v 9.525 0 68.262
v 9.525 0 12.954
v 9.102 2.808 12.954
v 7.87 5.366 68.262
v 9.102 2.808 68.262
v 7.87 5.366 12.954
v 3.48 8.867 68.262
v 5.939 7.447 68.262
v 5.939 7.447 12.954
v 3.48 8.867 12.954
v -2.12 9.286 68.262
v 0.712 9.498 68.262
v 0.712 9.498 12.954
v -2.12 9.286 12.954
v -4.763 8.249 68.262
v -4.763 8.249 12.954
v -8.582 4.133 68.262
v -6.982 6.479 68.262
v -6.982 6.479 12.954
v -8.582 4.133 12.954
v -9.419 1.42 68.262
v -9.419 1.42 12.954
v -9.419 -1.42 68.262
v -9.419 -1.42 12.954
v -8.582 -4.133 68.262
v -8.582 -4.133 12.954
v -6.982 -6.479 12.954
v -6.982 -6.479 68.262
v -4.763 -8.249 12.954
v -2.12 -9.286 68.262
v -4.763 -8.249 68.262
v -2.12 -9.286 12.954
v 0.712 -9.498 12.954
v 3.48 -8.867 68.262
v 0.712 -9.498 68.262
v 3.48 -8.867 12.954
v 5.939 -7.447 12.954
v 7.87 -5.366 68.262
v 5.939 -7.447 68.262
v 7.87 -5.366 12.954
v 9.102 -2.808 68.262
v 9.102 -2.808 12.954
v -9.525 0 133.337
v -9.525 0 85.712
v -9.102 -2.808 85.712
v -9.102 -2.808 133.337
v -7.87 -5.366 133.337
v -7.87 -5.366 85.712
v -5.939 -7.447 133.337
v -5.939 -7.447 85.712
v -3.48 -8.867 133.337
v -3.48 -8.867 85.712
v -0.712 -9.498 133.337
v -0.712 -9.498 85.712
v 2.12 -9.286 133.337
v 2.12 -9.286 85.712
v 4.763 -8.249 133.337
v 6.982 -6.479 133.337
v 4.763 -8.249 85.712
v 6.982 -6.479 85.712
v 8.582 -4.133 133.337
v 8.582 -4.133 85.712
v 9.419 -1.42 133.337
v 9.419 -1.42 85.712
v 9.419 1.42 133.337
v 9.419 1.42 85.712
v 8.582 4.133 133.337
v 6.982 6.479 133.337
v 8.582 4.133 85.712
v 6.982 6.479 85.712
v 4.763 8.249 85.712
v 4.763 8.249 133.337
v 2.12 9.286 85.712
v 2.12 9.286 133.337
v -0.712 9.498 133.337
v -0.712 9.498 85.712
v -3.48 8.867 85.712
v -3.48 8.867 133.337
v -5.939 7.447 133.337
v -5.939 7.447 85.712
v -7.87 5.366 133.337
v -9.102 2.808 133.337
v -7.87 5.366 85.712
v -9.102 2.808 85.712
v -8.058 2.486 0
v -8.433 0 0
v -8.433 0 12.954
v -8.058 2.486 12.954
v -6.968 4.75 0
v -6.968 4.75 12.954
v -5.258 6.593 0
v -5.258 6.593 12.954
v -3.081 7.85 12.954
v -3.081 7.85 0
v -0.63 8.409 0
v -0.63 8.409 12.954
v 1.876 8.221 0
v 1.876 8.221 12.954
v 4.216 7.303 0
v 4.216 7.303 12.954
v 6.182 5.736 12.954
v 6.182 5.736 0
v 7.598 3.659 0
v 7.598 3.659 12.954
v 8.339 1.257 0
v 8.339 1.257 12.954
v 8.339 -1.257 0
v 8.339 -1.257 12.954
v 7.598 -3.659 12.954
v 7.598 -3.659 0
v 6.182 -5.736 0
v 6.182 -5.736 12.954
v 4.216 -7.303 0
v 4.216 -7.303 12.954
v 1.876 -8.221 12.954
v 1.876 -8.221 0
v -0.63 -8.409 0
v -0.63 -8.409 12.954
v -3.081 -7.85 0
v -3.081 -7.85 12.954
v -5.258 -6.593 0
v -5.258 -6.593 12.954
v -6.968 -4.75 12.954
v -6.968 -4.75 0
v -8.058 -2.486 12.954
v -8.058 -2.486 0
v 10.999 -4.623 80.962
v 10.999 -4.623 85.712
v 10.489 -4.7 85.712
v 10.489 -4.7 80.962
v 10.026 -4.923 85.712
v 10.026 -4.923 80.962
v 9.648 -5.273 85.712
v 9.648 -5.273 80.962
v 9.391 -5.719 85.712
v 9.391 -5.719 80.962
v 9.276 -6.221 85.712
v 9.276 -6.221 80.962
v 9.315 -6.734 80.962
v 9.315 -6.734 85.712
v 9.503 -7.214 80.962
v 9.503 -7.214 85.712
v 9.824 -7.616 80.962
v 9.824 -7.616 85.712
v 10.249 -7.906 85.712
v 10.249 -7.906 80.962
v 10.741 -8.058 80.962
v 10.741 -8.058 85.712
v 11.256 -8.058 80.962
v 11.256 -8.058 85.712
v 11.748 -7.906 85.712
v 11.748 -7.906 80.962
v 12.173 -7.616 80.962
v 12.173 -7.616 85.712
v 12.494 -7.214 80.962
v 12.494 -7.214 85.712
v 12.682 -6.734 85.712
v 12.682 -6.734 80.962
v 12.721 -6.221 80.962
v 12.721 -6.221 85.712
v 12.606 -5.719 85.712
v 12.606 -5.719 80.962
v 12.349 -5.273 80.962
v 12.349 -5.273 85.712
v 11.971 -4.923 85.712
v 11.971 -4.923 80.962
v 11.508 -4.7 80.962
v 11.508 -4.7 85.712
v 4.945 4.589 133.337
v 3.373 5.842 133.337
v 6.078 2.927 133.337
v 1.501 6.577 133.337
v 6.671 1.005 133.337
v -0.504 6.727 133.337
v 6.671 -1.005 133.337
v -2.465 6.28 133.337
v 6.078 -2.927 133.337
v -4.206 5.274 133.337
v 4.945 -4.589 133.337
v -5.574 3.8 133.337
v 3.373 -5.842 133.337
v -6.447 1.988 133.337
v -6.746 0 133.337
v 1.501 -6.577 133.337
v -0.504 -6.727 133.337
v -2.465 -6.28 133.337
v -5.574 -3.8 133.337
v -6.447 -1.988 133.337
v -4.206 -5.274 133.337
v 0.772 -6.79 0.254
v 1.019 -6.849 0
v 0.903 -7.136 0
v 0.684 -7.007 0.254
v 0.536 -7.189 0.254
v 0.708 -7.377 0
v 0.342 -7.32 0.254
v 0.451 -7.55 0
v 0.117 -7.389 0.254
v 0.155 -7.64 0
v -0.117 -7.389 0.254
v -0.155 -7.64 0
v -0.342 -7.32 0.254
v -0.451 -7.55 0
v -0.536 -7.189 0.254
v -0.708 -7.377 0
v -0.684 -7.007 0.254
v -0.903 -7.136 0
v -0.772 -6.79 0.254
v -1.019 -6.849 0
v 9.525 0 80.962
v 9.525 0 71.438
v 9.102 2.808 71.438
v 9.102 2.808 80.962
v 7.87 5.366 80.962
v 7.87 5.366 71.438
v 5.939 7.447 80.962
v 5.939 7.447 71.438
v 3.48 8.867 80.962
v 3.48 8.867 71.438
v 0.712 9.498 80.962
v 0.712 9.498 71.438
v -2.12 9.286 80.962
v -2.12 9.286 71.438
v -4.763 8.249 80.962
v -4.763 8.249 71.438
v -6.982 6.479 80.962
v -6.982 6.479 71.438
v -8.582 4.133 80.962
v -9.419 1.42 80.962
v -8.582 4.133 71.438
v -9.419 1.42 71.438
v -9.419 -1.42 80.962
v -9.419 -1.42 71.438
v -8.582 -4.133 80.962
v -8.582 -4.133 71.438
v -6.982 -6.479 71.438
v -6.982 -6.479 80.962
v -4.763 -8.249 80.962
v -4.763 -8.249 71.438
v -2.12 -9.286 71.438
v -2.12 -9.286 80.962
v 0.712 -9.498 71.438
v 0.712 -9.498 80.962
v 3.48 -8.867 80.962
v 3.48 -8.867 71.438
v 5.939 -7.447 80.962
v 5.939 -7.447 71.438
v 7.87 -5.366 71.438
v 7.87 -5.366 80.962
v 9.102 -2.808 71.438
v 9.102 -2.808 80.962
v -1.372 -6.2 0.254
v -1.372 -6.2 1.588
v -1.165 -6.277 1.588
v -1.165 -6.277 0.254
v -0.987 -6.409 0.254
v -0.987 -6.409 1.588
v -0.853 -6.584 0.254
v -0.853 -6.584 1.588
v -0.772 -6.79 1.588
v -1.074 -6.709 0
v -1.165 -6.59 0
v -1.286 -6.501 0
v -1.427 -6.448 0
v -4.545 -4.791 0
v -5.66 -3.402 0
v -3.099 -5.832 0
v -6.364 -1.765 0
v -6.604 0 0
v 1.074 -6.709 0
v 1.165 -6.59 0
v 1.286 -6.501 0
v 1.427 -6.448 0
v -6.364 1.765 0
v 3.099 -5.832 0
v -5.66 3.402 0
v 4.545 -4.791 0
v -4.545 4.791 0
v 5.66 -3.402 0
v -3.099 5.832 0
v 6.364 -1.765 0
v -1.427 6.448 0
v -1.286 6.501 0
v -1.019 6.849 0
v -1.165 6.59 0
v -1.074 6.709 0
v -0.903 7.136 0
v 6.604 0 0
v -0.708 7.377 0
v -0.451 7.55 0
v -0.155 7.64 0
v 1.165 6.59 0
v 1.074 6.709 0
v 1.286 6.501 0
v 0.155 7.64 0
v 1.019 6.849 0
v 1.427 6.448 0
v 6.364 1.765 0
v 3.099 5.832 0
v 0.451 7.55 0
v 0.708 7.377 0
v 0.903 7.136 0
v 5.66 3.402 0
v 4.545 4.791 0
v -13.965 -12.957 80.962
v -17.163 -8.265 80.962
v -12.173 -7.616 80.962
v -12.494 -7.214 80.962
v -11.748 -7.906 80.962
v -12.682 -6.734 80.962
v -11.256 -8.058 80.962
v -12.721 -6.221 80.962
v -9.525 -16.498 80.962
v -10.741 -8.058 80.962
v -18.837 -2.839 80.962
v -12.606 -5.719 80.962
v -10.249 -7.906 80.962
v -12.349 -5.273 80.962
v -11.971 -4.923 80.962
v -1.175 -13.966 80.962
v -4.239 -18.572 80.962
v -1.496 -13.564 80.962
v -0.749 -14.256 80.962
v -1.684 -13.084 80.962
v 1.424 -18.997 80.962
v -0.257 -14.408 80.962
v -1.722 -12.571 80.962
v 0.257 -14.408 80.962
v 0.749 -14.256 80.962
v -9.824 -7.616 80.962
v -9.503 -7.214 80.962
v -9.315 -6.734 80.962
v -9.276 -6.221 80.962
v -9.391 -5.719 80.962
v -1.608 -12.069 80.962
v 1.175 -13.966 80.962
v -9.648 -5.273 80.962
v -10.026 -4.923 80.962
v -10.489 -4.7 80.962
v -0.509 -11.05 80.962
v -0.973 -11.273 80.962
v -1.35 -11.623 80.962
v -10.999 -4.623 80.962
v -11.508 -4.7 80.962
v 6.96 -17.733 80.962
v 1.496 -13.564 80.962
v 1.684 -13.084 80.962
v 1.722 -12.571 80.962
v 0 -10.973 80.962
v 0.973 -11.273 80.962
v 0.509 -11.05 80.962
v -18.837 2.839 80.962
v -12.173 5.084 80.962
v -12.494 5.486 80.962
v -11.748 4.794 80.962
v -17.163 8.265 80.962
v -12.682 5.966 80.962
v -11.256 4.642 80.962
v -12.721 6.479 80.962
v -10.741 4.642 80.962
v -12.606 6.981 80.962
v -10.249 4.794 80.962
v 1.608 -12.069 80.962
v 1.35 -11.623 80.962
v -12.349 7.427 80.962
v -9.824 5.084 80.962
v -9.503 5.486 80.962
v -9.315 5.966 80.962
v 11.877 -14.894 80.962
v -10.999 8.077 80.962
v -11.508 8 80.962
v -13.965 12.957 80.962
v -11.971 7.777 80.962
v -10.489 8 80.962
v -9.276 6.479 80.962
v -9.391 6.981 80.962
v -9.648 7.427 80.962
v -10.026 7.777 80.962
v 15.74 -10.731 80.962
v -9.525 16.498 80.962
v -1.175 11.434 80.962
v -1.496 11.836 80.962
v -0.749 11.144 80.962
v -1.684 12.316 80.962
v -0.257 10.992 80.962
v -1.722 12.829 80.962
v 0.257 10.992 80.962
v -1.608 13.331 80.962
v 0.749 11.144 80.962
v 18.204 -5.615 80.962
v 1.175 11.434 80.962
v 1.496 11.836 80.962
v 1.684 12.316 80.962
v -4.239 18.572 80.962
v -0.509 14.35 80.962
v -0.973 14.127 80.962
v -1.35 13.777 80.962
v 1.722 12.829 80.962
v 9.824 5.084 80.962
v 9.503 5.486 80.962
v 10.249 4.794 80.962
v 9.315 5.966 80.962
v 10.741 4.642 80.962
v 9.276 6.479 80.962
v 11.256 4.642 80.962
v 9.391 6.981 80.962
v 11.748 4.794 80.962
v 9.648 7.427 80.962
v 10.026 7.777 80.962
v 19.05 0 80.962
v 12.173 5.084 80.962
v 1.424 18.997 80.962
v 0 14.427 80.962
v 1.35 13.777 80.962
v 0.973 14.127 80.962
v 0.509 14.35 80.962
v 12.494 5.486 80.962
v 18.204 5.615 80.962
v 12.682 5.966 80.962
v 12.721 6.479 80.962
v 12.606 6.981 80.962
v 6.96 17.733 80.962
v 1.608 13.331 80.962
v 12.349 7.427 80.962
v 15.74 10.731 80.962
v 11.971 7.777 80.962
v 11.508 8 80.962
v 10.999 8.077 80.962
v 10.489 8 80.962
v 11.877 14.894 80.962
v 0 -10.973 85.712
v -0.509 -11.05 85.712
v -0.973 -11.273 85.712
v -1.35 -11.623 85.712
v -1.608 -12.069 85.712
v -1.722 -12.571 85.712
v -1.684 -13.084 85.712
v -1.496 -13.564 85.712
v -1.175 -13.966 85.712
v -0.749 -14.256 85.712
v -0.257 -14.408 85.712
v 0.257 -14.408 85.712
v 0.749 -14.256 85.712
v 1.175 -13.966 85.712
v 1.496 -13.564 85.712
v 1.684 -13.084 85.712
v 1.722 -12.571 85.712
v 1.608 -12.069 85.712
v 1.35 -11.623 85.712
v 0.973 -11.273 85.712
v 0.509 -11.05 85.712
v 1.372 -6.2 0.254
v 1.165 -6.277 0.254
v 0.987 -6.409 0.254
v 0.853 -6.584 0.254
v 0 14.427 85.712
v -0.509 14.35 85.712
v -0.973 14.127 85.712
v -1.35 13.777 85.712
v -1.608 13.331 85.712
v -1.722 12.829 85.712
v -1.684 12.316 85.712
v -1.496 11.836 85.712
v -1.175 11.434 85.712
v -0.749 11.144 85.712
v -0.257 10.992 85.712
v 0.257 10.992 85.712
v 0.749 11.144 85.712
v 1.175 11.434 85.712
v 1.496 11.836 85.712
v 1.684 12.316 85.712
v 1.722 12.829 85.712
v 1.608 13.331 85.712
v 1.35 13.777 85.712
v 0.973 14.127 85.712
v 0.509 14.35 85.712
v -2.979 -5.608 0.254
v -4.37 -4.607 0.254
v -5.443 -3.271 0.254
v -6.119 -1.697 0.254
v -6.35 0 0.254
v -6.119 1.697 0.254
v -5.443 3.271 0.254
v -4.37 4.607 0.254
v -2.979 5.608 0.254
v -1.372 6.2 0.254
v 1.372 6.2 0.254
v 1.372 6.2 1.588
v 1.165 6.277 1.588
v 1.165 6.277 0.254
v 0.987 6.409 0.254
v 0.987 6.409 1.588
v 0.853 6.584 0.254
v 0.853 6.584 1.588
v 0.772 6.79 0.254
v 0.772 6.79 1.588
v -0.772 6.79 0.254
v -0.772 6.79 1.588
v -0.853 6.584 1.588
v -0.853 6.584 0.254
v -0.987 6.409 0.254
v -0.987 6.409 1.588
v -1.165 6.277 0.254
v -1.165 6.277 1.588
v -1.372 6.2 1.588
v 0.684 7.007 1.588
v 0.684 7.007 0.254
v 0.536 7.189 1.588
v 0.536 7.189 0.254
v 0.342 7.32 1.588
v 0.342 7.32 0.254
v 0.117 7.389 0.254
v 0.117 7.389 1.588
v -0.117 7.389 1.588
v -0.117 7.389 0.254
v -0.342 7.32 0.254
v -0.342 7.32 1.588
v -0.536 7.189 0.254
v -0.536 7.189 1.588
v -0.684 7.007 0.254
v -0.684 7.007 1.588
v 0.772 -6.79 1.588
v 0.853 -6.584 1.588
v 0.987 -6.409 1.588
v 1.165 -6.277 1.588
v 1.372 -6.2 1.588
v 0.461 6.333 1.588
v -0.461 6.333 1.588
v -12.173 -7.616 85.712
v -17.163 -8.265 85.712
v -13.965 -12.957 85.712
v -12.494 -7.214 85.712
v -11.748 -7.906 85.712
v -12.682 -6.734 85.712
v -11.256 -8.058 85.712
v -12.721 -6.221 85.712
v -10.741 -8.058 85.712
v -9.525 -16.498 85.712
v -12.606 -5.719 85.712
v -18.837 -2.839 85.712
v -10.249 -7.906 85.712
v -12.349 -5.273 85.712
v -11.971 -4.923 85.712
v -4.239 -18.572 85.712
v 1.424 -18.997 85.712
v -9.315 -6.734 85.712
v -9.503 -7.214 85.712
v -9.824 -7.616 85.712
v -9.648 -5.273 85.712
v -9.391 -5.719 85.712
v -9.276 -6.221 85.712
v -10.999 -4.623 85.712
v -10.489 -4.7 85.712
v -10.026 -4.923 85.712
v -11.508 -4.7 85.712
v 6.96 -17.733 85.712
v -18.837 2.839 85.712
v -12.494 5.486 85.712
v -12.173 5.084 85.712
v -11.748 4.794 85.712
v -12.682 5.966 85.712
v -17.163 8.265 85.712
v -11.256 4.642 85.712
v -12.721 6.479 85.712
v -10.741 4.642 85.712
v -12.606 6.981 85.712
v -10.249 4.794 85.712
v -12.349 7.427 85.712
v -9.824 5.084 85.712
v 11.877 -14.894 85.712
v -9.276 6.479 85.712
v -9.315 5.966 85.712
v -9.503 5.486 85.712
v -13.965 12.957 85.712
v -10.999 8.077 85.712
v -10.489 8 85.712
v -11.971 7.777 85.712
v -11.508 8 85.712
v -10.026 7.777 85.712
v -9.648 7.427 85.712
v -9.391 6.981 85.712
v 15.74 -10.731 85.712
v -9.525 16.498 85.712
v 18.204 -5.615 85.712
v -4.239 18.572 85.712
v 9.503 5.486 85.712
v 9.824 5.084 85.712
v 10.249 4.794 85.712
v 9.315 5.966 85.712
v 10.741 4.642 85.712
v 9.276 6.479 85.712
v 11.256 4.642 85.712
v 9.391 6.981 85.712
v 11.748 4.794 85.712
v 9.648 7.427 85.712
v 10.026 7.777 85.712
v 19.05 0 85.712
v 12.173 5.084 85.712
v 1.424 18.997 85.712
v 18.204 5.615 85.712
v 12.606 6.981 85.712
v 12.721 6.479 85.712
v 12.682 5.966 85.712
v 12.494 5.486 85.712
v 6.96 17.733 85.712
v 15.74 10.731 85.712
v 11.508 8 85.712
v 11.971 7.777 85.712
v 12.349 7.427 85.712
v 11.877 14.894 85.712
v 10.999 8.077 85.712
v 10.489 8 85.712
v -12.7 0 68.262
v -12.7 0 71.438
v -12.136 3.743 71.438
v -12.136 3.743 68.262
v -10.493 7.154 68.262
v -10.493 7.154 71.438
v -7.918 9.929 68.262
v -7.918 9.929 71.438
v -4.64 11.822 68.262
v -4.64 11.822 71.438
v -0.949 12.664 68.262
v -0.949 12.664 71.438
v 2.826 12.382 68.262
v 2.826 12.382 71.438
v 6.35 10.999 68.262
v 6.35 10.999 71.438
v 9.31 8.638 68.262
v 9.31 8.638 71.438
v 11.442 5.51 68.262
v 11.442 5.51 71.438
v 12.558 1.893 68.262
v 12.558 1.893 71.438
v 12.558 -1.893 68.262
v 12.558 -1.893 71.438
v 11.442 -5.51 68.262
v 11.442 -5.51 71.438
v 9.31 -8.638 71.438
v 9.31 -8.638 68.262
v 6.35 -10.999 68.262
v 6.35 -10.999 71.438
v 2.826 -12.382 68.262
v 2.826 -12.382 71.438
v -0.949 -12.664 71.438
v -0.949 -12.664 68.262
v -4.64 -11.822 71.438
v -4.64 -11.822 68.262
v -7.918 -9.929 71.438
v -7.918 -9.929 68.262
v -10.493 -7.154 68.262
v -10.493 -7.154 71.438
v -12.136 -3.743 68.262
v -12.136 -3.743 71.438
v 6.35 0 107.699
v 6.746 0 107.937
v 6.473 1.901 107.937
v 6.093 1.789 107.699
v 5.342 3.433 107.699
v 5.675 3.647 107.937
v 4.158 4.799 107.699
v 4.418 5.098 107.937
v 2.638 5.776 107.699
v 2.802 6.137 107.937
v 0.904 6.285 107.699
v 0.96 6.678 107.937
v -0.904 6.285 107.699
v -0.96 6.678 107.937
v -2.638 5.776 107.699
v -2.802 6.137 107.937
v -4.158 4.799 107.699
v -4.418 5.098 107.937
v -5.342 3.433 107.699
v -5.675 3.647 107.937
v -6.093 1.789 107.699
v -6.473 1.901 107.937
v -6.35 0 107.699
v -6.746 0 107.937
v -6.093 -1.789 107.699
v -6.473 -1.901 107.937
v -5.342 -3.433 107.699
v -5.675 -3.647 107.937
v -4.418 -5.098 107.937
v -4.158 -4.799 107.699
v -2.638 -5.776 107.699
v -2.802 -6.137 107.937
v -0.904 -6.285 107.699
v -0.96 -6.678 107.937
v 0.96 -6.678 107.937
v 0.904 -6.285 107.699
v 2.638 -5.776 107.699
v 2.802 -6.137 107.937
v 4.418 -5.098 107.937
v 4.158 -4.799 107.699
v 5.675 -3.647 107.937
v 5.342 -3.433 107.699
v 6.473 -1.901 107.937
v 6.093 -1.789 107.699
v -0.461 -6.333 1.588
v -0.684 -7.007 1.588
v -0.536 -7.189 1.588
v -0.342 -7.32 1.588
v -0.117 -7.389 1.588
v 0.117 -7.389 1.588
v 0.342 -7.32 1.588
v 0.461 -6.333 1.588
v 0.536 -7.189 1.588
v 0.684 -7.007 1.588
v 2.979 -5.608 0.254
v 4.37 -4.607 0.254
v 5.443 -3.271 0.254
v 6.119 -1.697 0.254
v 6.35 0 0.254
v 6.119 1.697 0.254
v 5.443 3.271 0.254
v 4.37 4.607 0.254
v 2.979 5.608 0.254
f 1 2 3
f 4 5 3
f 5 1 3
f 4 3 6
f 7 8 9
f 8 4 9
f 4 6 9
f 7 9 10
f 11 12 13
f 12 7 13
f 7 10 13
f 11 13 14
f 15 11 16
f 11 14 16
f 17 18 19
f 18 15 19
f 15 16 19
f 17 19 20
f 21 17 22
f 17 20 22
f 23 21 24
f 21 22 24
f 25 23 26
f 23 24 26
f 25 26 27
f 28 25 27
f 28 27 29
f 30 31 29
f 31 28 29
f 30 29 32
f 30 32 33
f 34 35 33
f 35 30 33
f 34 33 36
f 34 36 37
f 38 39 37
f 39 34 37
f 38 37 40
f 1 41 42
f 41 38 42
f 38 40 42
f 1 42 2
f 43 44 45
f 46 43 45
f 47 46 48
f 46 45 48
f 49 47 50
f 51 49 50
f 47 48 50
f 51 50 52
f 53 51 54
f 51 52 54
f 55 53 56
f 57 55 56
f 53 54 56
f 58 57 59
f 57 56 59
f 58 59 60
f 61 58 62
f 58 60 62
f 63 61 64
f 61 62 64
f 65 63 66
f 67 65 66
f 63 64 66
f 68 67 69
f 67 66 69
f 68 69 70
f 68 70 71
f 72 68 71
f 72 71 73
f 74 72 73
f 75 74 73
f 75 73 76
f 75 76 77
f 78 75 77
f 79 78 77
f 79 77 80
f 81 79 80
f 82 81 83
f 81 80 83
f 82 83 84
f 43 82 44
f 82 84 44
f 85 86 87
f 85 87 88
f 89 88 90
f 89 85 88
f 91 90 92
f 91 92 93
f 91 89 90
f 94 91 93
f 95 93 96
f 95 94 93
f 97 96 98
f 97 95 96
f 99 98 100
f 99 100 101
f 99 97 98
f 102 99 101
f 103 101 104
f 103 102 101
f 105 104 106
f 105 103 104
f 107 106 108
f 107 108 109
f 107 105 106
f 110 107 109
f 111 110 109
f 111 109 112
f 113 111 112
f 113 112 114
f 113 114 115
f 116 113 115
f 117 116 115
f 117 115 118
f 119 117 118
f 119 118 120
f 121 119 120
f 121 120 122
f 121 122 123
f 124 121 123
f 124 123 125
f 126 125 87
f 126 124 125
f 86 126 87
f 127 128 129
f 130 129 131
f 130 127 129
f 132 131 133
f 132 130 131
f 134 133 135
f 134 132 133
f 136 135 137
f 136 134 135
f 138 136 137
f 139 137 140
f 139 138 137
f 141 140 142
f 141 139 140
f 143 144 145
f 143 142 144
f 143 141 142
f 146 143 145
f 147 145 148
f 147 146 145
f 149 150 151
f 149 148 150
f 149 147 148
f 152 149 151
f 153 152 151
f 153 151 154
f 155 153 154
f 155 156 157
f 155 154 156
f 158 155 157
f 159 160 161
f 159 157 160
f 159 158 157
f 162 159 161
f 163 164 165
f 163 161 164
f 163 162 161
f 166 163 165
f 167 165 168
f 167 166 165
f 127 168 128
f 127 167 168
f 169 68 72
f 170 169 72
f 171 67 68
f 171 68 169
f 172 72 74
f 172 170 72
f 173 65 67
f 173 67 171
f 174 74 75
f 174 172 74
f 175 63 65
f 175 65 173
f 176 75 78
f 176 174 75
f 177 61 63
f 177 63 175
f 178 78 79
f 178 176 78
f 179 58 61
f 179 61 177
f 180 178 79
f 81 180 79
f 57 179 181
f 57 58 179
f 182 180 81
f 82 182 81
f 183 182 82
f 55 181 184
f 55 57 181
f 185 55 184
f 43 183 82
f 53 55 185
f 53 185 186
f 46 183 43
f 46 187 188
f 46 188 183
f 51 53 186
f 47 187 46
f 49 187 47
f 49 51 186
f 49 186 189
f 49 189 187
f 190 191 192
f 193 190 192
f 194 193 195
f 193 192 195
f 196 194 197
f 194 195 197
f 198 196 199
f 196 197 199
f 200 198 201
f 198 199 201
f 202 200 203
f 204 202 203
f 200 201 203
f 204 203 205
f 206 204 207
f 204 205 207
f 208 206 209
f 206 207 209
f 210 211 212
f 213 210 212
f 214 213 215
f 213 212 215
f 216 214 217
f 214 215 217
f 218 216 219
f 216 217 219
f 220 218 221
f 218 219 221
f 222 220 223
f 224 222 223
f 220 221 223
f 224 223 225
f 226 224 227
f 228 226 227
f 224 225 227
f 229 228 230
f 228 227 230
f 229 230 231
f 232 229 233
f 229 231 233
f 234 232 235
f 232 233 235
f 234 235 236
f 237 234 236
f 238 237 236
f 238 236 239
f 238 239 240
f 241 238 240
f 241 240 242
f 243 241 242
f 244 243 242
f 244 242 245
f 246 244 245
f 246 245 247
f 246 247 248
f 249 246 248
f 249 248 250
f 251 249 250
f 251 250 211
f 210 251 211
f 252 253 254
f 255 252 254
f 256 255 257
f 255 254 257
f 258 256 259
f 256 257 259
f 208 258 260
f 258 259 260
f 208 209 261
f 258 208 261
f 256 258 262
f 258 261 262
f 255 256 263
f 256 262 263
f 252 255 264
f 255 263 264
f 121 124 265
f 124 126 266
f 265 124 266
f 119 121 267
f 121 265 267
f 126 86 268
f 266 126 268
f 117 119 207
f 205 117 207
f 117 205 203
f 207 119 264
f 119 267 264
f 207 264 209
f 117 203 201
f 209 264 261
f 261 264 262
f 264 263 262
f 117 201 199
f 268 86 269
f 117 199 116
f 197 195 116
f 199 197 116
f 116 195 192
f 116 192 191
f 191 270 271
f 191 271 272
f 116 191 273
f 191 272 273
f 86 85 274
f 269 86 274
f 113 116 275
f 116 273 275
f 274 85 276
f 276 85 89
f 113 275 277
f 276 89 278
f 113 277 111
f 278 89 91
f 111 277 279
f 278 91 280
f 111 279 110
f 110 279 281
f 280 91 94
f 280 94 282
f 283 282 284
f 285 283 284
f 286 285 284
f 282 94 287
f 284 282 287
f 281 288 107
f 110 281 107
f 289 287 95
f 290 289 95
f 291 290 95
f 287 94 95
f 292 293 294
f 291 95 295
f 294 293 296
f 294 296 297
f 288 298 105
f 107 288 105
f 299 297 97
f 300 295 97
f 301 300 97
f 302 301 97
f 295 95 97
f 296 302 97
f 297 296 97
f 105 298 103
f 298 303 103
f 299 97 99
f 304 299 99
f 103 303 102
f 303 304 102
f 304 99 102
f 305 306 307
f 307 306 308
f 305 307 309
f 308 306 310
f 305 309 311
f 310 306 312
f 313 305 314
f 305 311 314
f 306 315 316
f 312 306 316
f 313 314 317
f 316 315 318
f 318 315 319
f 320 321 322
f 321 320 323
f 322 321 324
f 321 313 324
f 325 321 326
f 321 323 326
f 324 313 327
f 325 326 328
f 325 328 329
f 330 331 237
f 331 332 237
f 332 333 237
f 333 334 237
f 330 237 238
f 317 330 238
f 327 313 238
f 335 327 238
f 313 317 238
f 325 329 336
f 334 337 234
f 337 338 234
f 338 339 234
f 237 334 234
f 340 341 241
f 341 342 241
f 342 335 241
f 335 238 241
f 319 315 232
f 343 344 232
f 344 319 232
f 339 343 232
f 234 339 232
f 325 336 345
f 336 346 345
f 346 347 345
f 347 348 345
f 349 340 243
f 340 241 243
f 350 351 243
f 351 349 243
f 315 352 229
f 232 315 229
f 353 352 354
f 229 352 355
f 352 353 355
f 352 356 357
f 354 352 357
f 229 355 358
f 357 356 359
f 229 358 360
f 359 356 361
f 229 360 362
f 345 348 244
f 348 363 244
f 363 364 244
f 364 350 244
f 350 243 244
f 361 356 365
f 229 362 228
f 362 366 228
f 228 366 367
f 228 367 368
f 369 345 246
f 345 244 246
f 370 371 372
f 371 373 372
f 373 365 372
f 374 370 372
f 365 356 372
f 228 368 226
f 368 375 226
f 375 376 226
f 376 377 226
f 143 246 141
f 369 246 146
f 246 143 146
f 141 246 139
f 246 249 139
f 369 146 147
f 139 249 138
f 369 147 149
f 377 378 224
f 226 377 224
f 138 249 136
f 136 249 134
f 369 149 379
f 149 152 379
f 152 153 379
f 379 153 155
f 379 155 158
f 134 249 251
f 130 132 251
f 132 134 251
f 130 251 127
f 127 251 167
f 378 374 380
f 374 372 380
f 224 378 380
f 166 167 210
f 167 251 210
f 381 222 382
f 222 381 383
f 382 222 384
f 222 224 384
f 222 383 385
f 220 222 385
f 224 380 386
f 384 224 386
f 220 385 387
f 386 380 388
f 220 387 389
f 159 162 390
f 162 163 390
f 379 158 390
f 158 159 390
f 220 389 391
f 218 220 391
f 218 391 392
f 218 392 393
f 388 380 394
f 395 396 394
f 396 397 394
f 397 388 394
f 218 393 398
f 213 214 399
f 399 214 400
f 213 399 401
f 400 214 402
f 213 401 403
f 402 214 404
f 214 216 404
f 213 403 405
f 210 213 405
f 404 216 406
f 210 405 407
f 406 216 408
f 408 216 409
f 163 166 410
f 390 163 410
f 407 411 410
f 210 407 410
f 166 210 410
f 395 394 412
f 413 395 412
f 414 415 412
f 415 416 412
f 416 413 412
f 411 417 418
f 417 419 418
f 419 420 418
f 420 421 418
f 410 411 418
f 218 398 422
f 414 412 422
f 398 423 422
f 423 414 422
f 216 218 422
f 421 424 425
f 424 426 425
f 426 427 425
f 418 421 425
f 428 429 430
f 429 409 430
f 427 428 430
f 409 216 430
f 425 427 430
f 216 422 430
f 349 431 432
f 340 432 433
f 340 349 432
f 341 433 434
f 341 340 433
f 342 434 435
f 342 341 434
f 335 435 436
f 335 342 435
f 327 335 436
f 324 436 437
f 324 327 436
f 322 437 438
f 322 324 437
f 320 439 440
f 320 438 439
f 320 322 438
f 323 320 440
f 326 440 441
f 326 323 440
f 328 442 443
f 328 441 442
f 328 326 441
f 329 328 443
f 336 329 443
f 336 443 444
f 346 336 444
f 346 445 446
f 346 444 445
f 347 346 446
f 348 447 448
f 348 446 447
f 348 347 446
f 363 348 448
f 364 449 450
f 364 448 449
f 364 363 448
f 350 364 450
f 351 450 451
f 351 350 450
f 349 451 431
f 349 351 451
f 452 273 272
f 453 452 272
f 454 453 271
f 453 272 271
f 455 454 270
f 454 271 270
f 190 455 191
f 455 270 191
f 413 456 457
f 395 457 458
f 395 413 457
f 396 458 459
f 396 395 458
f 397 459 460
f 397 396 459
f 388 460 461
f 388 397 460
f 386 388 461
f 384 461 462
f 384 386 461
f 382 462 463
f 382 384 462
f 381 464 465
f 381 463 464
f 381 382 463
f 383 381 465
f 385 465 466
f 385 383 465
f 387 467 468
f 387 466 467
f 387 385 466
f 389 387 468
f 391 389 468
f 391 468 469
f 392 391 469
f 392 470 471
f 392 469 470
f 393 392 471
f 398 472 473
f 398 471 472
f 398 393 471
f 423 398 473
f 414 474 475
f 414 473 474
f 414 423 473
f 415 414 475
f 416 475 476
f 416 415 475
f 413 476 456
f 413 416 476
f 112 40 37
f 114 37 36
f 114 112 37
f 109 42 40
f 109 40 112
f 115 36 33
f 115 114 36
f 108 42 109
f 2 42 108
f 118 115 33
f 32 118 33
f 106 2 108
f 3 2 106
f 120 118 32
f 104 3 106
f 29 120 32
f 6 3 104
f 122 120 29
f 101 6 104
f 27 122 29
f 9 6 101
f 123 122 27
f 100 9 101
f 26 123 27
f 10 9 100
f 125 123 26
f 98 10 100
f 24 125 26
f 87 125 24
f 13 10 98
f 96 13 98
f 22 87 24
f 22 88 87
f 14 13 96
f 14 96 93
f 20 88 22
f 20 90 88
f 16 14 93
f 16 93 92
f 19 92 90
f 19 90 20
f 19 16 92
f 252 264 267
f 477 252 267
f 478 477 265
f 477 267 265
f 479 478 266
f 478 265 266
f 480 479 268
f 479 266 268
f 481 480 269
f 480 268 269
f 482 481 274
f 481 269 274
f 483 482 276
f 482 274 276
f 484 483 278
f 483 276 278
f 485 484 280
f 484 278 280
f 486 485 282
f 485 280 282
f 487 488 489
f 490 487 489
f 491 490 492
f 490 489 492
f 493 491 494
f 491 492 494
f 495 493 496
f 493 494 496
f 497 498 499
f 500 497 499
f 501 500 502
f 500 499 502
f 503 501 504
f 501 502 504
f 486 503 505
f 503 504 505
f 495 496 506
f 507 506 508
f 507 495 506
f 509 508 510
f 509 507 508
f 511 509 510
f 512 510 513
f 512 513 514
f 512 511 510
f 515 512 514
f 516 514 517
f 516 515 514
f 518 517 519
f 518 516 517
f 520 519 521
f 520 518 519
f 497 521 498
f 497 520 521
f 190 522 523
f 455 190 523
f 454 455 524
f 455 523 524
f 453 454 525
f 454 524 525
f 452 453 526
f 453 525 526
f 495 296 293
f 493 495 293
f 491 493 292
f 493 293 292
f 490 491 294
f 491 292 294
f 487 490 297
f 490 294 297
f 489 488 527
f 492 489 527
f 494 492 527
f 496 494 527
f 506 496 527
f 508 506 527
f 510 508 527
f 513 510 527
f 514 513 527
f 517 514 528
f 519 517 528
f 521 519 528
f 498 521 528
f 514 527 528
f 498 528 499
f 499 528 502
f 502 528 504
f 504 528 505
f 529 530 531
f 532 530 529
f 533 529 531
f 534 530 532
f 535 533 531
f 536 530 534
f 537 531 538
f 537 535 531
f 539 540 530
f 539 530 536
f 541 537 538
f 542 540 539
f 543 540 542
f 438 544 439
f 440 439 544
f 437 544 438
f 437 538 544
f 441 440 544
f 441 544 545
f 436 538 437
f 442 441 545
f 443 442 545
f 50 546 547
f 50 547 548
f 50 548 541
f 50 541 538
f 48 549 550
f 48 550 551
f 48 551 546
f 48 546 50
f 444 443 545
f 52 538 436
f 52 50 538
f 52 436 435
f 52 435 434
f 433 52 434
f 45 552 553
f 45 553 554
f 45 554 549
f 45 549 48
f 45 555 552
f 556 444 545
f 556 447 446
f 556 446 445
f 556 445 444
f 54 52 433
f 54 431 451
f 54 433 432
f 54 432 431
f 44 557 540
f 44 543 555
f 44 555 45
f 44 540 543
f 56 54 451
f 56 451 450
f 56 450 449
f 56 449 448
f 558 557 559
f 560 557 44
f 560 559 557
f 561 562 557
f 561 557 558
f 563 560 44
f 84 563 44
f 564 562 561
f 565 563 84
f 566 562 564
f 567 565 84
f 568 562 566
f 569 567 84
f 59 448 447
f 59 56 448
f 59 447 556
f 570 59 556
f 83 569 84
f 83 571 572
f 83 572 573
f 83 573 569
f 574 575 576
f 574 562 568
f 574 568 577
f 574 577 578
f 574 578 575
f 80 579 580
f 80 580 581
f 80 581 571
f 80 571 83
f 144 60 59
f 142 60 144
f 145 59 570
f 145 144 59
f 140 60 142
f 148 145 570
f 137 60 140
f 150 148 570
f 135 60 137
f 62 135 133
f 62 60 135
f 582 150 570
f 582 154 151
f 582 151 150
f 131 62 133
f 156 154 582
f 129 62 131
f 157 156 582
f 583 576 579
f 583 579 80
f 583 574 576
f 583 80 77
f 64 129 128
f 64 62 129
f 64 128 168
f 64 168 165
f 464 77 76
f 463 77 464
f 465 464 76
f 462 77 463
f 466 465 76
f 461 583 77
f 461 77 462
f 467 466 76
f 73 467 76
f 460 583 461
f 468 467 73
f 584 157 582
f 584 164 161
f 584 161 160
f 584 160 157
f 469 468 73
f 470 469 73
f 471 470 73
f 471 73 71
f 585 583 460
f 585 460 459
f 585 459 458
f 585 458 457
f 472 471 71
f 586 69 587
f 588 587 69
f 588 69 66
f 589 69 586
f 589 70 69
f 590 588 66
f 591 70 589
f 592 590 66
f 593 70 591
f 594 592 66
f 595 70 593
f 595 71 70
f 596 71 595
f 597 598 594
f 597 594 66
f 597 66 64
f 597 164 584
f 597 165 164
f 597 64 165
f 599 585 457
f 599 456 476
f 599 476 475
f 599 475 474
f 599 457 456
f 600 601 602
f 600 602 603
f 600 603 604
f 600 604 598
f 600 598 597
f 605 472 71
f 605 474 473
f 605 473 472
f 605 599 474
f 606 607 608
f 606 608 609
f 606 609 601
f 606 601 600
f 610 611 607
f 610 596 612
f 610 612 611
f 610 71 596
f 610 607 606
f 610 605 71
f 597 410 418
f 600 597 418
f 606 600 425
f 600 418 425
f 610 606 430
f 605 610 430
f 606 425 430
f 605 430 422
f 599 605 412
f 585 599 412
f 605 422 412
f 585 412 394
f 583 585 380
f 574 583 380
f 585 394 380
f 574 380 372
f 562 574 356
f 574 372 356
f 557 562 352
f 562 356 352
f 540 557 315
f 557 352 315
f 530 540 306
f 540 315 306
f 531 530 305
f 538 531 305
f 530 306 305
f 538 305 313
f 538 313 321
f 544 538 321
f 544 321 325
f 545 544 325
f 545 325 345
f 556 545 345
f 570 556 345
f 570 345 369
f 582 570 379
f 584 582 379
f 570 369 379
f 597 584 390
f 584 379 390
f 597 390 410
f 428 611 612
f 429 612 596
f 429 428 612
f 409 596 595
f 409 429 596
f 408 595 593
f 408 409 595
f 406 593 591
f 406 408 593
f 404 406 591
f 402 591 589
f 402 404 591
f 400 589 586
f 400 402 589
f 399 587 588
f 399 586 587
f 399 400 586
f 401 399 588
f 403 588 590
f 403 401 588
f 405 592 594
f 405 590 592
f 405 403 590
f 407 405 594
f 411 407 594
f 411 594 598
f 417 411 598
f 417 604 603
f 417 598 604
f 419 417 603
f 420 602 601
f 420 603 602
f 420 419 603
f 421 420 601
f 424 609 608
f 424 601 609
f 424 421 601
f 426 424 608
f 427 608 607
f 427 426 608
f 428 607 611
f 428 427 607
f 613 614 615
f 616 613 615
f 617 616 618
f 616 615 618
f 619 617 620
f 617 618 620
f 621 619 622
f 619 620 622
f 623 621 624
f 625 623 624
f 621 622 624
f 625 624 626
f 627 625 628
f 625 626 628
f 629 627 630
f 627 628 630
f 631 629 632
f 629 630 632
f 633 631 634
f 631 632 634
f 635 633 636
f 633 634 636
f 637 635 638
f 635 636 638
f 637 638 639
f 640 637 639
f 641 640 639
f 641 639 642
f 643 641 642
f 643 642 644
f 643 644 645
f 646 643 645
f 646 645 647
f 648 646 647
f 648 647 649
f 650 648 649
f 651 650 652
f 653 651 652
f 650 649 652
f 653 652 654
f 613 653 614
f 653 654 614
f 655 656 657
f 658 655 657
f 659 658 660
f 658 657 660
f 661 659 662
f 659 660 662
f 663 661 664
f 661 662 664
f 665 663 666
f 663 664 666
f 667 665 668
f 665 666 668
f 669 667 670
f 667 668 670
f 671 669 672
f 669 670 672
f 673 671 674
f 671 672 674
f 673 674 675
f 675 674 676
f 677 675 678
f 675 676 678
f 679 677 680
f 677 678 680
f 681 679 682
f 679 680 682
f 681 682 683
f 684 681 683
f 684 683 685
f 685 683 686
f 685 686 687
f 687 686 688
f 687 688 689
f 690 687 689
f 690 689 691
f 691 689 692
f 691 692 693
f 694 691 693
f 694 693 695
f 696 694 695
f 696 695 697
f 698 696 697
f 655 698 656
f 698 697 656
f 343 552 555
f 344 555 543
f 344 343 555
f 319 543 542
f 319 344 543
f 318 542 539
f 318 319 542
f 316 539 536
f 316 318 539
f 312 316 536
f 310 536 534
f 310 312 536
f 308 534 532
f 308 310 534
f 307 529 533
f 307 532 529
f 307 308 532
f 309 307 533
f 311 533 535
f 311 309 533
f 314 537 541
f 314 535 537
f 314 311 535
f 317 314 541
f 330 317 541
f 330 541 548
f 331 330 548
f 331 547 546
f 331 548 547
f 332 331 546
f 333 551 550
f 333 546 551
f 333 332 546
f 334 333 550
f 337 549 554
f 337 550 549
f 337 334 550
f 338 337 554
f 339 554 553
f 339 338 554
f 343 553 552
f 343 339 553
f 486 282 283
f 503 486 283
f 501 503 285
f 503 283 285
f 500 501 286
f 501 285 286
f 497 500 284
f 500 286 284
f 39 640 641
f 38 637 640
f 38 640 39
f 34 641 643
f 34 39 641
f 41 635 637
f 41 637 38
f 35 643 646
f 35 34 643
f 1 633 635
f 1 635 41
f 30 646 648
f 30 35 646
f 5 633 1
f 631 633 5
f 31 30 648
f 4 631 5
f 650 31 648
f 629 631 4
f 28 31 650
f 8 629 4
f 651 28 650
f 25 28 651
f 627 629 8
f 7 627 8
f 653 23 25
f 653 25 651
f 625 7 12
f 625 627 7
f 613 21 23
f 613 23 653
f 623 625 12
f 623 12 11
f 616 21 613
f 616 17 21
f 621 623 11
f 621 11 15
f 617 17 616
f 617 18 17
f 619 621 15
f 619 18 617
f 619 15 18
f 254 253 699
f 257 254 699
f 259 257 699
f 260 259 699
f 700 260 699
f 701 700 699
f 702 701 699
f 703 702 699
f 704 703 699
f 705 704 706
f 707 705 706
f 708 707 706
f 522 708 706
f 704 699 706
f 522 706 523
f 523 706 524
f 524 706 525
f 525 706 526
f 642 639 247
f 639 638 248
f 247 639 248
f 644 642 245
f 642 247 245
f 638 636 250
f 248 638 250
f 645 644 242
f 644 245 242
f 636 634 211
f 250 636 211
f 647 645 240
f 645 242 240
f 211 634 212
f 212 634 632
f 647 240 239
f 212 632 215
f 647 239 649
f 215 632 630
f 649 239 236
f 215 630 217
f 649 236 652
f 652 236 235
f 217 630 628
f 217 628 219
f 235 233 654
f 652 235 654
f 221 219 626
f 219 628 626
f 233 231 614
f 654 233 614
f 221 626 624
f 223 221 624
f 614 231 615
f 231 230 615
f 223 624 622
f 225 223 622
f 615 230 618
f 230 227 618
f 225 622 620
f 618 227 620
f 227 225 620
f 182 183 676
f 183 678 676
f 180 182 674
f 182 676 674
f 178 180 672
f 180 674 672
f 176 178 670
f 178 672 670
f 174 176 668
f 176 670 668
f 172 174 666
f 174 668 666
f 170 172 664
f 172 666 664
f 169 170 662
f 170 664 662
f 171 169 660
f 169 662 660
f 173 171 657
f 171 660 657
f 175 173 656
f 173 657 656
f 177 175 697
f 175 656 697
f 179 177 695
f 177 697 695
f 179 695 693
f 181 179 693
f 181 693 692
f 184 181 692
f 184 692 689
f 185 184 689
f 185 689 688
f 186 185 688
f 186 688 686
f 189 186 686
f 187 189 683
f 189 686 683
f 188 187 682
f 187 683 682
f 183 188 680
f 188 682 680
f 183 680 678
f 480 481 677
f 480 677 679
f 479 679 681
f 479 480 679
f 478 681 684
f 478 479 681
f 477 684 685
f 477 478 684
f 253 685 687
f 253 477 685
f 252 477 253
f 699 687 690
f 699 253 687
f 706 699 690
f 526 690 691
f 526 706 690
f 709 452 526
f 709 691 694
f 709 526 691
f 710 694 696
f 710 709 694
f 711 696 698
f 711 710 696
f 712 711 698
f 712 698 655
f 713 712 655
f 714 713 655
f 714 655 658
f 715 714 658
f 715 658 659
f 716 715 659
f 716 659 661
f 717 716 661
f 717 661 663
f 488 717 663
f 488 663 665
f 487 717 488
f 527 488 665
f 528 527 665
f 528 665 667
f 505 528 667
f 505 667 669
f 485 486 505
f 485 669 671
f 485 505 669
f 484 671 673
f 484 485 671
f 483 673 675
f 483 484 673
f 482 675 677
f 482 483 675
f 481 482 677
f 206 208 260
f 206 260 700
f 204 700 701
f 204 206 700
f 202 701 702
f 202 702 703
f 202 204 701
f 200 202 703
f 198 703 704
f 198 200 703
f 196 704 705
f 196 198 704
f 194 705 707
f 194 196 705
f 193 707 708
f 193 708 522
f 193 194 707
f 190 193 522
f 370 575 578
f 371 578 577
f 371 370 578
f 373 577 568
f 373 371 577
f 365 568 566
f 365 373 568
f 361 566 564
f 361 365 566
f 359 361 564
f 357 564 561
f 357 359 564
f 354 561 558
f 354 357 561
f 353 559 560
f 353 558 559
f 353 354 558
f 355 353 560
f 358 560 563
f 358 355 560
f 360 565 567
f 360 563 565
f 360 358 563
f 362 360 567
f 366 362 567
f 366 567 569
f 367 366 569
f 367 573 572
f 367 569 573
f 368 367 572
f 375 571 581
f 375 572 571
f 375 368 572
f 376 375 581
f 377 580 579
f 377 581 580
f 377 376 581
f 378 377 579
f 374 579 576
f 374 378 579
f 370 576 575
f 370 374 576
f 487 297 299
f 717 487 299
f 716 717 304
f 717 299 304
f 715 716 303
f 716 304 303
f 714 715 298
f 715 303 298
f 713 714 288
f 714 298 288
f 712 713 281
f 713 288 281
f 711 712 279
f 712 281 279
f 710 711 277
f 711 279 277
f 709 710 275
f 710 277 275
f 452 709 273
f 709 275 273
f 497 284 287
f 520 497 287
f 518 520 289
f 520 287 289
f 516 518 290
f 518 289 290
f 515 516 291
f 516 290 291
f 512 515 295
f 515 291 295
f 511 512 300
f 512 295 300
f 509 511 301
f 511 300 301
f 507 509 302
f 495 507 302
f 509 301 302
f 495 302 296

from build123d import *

# Parameters (mm, degrees)
SKETCH1_R                      = 9.525
BOSS_EXTRUDE1_DEPTH            = 80.9625
SKETCH2_R                      = 19.05
BOSS_EXTRUDE2_DEPTH            = 4.7498
SKETCH5_OUTSIDE_W              = 60.348
SKETCH5_OUTSIDE_H              = 60.348
SKETCH5_OUTSIDE_R              = 8.4328
CUT_EXTRUDE1_DEPTH             = 12.954
SKETCH7_R                      = 12.7
BOSS_EXTRUDE3_DEPTH            = 3.175
F_8_32_TAPPED_HOLE1_AT_2_COUNT = 2
F_8_32_TAPPED_HOLE1_AT_2_PITCH = 12.7
F_8_32_TAPPED_HOLE1_AT_3_COUNT = 2
F_8_32_TAPPED_HOLE1_AT_3_PITCH = 21.997045256
F_8_32_TAPPED_HOLE1_AT_4_COUNT = 2
F_8_32_TAPPED_HOLE1_AT_4_PITCH = 25.4
F_8_32_TAPPED_HOLE1_AT_5_COUNT = 2
F_8_32_TAPPED_HOLE1_AT_5_PITCH = 21.997045256
F_8_32_TAPPED_HOLE1_AT_6_COUNT = 2
F_8_32_TAPPED_HOLE1_AT_6_PITCH = 12.7
SKETCH6_R                      = 6.35
CUT_EXTRUDE2_DEPTH             = 90.846554588
SKETCH10_R                     = 9.525
SKETCH10_R_2                   = 6.35
BOSS_EXTRUDE4_DEPTH            = 47.625
F_5_8_11_TAPPED_HOLE1_D        = 13.49248
F_5_8_11_TAPPED_HOLE1_DEPTH    = 25.4
F_5_8_11_TAPPED_HOLE1_TIP      = 4.053549943
CUT_EXTRUDE3_DEPTH             = 1.5875
FILLET1_R                      = 0.79375
CHAMFER1_SIZE                  = 0.254


with BuildPart() as part:
    # Sketch1 → Boss-Extrude1 (new body)
    with BuildSketch(Plane.XY):
        Circle(SKETCH1_R)
    extrude(amount=BOSS_EXTRUDE1_DEPTH)

    # Sketch2 → Boss-Extrude2 (add)
    with BuildSketch(Plane.XY.offset(80.9625)):
        Circle(SKETCH2_R)
    extrude(amount=BOSS_EXTRUDE2_DEPTH)

    # Sketch5 outside → Cut-Extrude1 (cut)
    with BuildSketch(Plane(origin=(0, 0, 0), x_dir=(-1, 0, 0), z_dir=(0, 0, -1))):
        Rectangle(SKETCH5_OUTSIDE_W, SKETCH5_OUTSIDE_H)
        Circle(SKETCH5_OUTSIDE_R, mode=Mode.SUBTRACT)
    extrude(amount=-CUT_EXTRUDE1_DEPTH, mode=Mode.SUBTRACT)

    # Sketch7 → Boss-Extrude3 (add)
    with BuildSketch(Plane(origin=(0, 0, 71.4375), x_dir=(-1, 0, 0), z_dir=(0, 0, -1))):
        Circle(SKETCH7_R)
    extrude(amount=BOSS_EXTRUDE3_DEPTH)

    # Sketch8 → #8-32 Tapped Hole1 (revolve, cut)
    with BuildSketch(Plane(origin=(0, 12.7, 80.9625), x_dir=(0, 1, 0), z_dir=(1, 0, 0))):
        Polygon((0, 0), (0, 11.705806461), (1.7272, 10.668), (1.7272, 0), align=None)
    f_8_32_tapped_hole1 = revolve(axis=Axis((0, 12.7, 74.6125), (0, 0, 1)), mode=Mode.SUBTRACT)

    # #8-32 Tapped Hole1 at 2: #8-32 Tapped Hole1 ×2
    with Locations(*[Vector(-0.8660254037844382, -0.500000000000001, 0) * (i * F_8_32_TAPPED_HOLE1_AT_2_PITCH) for i in range(1, F_8_32_TAPPED_HOLE1_AT_2_COUNT)]):
        add(f_8_32_tapped_hole1, mode=Mode.SUBTRACT)

    # #8-32 Tapped Hole1 at 3: #8-32 Tapped Hole1 ×2
    with Locations(*[Vector(-0.5000000000000153, -0.8660254037844298, 0) * (i * F_8_32_TAPPED_HOLE1_AT_3_PITCH) for i in range(1, F_8_32_TAPPED_HOLE1_AT_3_COUNT)]):
        add(f_8_32_tapped_hole1, mode=Mode.SUBTRACT)

    # #8-32 Tapped Hole1 at 4: #8-32 Tapped Hole1 ×2
    with Locations(*[(0, -i * F_8_32_TAPPED_HOLE1_AT_4_PITCH, 0) for i in range(1, F_8_32_TAPPED_HOLE1_AT_4_COUNT)]):
        add(f_8_32_tapped_hole1, mode=Mode.SUBTRACT)

    # #8-32 Tapped Hole1 at 5: #8-32 Tapped Hole1 ×2
    with Locations(*[Vector(0.4999999999999846, -0.8660254037844476, 0) * (i * F_8_32_TAPPED_HOLE1_AT_5_PITCH) for i in range(1, F_8_32_TAPPED_HOLE1_AT_5_COUNT)]):
        add(f_8_32_tapped_hole1, mode=Mode.SUBTRACT)

    # #8-32 Tapped Hole1 at 6: #8-32 Tapped Hole1 ×2
    with Locations(*[Vector(0.86602540378443, -0.5000000000000151, 0) * (i * F_8_32_TAPPED_HOLE1_AT_6_PITCH) for i in range(1, F_8_32_TAPPED_HOLE1_AT_6_COUNT)]):
        add(f_8_32_tapped_hole1, mode=Mode.SUBTRACT)

    # Sketch6 → Cut-Extrude2 (cut, through all)
    with BuildSketch(Plane(origin=(0, 0, 0), x_dir=(-1, 0, 0), z_dir=(0, 0, -1))):
        Circle(SKETCH6_R)
    extrude(amount=-CUT_EXTRUDE2_DEPTH, mode=Mode.SUBTRACT)

    # Sketch10 → Boss-Extrude4 (add)
    with BuildSketch(Plane.XY.offset(85.7123)):
        with Locations(Location((0, 0, 0), (0, 0, 180))):
            Circle(SKETCH10_R)
        with Locations(Location((0, 0, 0), (0, 0, 180))):
            Circle(SKETCH10_R_2, mode=Mode.SUBTRACT)
    extrude(amount=BOSS_EXTRUDE4_DEPTH)

    # 5/8-11 Tapped Hole1
    with Locations(Plane.XY.offset(133.3373)):
        with Locations((0, 0)):
            Hole(F_5_8_11_TAPPED_HOLE1_D / 2, depth=F_5_8_11_TAPPED_HOLE1_DEPTH)
            with Locations((0, 0, -(F_5_8_11_TAPPED_HOLE1_DEPTH + F_5_8_11_TAPPED_HOLE1_TIP / 2))):  # 118° drill point
                Cone(0, F_5_8_11_TAPPED_HOLE1_D / 2, F_5_8_11_TAPPED_HOLE1_TIP, mode=Mode.SUBTRACT)

    # Sketch13 → Cut-Extrude3 (cut)
    with BuildSketch(Plane(origin=(0, 0, 0), x_dir=(-1, 0, 0), z_dir=(0, 0, -1))):
        with BuildLine():
            Line((-0.79375, -6.604), (-0.79375, 6.604))
            ThreePointArc((-0.79375, 6.604), (0, 7.39775), (0.79375, 6.604))
            Line((0.79375, 6.604), (0.79375, -6.604))
            ThreePointArc((0.79375, -6.604), (0, -7.39775), (-0.79375, -6.604))
        make_face()
    extrude(amount=-CUT_EXTRUDE3_DEPTH, mode=Mode.SUBTRACT)

    # Fillet1
    # the kernel refuses this fillet: 0.79375 mm, written as the material it takes off along each edge
    with BuildSketch(Plane(origin=(0.79375, -6.300195309, 1.5875), x_dir=(0.9853201649720871, 0.17071664388506244, 0), z_dir=(0, 0, -1)), Plane(origin=(-0.79375, 6.300195309, 1.5875), x_dir=(-0.9853201649720869, -0.17071664388506383, 0), z_dir=(0, 0, -1))) as fillet1_piece_1:
        with BuildLine():
            CenterArc((0.623581926, 0.792901977), FILLET1_R, 203.344606785, 64.006660147)
            Line((-0.105190236, 0.478370264), (-0.178067452, 0.446917093))
            ThreePointArc((-0.178067452, 0.446917093), (-0.130074305, 0.285794254), (-0.078209788, -0.013550634))
            Line((-0.078209788, -0.013550634), (0.003668129, -0.079290198))
            ThreePointArc((0.003668129, -0.079290198), (0.293450318, -0.072590818), (0.583232507, -0.079290198))
            Line((0.583232507, -0.079290198), (0.586900636, 0))
        make_face()
    extrude(amount=3.054751591, mode=Mode.SUBTRACT)
    with BuildSketch(Plane(origin=(0.79375, 6.300195309, 1.5875), x_dir=(0.985320164972087, -0.17071664388506264, 0), z_dir=(0, 0, -1)), Plane(origin=(-0.79375, -6.300195309, 1.5875), x_dir=(-0.9853201649720869, 0.17071664388506363, 0), z_dir=(0, 0, -1))) as fillet1_piece_2:
        with BuildLine():
            CenterArc((0.623581926, -0.792901977), FILLET1_R, 92.648733068, 64.006660147)
            Line((-0.105190236, -0.478370264), (-0.178067452, -0.446917093))
            ThreePointArc((-0.178067452, -0.446917093), (-0.130074305, -0.285794254), (-0.078209788, 0.013550634))
            Line((-0.078209788, 0.013550634), (0.003668129, 0.079290198))
            ThreePointArc((0.003668129, 0.079290198), (0.293450318, 0.072590818), (0.583232507, 0.079290198))
            Line((0.583232507, 0.079290198), (0.586900636, 0))
        make_face()
    extrude(amount=3.054751591, mode=Mode.SUBTRACT)

    # Chamfer1
    chamfer1_edges = [part.edges().sort_by_distance(p)[0] for p in [
        (6.35, 0, 0),
        (-4.951511004, 3.975555153, 0),
        (0, -7.39775, 0),
        (0, 7.39775, 0),
        (0.987374997, 6.408680157, 0),
        (-0.987374997, 6.408680157, 0),
        (-0.987374997, -6.408680157, 0),
        (0.987374997, -6.408680157, 0),
    ]]
    chamfer(chamfer1_edges, length=CHAMFER1_SIZE)


solid = part.part
